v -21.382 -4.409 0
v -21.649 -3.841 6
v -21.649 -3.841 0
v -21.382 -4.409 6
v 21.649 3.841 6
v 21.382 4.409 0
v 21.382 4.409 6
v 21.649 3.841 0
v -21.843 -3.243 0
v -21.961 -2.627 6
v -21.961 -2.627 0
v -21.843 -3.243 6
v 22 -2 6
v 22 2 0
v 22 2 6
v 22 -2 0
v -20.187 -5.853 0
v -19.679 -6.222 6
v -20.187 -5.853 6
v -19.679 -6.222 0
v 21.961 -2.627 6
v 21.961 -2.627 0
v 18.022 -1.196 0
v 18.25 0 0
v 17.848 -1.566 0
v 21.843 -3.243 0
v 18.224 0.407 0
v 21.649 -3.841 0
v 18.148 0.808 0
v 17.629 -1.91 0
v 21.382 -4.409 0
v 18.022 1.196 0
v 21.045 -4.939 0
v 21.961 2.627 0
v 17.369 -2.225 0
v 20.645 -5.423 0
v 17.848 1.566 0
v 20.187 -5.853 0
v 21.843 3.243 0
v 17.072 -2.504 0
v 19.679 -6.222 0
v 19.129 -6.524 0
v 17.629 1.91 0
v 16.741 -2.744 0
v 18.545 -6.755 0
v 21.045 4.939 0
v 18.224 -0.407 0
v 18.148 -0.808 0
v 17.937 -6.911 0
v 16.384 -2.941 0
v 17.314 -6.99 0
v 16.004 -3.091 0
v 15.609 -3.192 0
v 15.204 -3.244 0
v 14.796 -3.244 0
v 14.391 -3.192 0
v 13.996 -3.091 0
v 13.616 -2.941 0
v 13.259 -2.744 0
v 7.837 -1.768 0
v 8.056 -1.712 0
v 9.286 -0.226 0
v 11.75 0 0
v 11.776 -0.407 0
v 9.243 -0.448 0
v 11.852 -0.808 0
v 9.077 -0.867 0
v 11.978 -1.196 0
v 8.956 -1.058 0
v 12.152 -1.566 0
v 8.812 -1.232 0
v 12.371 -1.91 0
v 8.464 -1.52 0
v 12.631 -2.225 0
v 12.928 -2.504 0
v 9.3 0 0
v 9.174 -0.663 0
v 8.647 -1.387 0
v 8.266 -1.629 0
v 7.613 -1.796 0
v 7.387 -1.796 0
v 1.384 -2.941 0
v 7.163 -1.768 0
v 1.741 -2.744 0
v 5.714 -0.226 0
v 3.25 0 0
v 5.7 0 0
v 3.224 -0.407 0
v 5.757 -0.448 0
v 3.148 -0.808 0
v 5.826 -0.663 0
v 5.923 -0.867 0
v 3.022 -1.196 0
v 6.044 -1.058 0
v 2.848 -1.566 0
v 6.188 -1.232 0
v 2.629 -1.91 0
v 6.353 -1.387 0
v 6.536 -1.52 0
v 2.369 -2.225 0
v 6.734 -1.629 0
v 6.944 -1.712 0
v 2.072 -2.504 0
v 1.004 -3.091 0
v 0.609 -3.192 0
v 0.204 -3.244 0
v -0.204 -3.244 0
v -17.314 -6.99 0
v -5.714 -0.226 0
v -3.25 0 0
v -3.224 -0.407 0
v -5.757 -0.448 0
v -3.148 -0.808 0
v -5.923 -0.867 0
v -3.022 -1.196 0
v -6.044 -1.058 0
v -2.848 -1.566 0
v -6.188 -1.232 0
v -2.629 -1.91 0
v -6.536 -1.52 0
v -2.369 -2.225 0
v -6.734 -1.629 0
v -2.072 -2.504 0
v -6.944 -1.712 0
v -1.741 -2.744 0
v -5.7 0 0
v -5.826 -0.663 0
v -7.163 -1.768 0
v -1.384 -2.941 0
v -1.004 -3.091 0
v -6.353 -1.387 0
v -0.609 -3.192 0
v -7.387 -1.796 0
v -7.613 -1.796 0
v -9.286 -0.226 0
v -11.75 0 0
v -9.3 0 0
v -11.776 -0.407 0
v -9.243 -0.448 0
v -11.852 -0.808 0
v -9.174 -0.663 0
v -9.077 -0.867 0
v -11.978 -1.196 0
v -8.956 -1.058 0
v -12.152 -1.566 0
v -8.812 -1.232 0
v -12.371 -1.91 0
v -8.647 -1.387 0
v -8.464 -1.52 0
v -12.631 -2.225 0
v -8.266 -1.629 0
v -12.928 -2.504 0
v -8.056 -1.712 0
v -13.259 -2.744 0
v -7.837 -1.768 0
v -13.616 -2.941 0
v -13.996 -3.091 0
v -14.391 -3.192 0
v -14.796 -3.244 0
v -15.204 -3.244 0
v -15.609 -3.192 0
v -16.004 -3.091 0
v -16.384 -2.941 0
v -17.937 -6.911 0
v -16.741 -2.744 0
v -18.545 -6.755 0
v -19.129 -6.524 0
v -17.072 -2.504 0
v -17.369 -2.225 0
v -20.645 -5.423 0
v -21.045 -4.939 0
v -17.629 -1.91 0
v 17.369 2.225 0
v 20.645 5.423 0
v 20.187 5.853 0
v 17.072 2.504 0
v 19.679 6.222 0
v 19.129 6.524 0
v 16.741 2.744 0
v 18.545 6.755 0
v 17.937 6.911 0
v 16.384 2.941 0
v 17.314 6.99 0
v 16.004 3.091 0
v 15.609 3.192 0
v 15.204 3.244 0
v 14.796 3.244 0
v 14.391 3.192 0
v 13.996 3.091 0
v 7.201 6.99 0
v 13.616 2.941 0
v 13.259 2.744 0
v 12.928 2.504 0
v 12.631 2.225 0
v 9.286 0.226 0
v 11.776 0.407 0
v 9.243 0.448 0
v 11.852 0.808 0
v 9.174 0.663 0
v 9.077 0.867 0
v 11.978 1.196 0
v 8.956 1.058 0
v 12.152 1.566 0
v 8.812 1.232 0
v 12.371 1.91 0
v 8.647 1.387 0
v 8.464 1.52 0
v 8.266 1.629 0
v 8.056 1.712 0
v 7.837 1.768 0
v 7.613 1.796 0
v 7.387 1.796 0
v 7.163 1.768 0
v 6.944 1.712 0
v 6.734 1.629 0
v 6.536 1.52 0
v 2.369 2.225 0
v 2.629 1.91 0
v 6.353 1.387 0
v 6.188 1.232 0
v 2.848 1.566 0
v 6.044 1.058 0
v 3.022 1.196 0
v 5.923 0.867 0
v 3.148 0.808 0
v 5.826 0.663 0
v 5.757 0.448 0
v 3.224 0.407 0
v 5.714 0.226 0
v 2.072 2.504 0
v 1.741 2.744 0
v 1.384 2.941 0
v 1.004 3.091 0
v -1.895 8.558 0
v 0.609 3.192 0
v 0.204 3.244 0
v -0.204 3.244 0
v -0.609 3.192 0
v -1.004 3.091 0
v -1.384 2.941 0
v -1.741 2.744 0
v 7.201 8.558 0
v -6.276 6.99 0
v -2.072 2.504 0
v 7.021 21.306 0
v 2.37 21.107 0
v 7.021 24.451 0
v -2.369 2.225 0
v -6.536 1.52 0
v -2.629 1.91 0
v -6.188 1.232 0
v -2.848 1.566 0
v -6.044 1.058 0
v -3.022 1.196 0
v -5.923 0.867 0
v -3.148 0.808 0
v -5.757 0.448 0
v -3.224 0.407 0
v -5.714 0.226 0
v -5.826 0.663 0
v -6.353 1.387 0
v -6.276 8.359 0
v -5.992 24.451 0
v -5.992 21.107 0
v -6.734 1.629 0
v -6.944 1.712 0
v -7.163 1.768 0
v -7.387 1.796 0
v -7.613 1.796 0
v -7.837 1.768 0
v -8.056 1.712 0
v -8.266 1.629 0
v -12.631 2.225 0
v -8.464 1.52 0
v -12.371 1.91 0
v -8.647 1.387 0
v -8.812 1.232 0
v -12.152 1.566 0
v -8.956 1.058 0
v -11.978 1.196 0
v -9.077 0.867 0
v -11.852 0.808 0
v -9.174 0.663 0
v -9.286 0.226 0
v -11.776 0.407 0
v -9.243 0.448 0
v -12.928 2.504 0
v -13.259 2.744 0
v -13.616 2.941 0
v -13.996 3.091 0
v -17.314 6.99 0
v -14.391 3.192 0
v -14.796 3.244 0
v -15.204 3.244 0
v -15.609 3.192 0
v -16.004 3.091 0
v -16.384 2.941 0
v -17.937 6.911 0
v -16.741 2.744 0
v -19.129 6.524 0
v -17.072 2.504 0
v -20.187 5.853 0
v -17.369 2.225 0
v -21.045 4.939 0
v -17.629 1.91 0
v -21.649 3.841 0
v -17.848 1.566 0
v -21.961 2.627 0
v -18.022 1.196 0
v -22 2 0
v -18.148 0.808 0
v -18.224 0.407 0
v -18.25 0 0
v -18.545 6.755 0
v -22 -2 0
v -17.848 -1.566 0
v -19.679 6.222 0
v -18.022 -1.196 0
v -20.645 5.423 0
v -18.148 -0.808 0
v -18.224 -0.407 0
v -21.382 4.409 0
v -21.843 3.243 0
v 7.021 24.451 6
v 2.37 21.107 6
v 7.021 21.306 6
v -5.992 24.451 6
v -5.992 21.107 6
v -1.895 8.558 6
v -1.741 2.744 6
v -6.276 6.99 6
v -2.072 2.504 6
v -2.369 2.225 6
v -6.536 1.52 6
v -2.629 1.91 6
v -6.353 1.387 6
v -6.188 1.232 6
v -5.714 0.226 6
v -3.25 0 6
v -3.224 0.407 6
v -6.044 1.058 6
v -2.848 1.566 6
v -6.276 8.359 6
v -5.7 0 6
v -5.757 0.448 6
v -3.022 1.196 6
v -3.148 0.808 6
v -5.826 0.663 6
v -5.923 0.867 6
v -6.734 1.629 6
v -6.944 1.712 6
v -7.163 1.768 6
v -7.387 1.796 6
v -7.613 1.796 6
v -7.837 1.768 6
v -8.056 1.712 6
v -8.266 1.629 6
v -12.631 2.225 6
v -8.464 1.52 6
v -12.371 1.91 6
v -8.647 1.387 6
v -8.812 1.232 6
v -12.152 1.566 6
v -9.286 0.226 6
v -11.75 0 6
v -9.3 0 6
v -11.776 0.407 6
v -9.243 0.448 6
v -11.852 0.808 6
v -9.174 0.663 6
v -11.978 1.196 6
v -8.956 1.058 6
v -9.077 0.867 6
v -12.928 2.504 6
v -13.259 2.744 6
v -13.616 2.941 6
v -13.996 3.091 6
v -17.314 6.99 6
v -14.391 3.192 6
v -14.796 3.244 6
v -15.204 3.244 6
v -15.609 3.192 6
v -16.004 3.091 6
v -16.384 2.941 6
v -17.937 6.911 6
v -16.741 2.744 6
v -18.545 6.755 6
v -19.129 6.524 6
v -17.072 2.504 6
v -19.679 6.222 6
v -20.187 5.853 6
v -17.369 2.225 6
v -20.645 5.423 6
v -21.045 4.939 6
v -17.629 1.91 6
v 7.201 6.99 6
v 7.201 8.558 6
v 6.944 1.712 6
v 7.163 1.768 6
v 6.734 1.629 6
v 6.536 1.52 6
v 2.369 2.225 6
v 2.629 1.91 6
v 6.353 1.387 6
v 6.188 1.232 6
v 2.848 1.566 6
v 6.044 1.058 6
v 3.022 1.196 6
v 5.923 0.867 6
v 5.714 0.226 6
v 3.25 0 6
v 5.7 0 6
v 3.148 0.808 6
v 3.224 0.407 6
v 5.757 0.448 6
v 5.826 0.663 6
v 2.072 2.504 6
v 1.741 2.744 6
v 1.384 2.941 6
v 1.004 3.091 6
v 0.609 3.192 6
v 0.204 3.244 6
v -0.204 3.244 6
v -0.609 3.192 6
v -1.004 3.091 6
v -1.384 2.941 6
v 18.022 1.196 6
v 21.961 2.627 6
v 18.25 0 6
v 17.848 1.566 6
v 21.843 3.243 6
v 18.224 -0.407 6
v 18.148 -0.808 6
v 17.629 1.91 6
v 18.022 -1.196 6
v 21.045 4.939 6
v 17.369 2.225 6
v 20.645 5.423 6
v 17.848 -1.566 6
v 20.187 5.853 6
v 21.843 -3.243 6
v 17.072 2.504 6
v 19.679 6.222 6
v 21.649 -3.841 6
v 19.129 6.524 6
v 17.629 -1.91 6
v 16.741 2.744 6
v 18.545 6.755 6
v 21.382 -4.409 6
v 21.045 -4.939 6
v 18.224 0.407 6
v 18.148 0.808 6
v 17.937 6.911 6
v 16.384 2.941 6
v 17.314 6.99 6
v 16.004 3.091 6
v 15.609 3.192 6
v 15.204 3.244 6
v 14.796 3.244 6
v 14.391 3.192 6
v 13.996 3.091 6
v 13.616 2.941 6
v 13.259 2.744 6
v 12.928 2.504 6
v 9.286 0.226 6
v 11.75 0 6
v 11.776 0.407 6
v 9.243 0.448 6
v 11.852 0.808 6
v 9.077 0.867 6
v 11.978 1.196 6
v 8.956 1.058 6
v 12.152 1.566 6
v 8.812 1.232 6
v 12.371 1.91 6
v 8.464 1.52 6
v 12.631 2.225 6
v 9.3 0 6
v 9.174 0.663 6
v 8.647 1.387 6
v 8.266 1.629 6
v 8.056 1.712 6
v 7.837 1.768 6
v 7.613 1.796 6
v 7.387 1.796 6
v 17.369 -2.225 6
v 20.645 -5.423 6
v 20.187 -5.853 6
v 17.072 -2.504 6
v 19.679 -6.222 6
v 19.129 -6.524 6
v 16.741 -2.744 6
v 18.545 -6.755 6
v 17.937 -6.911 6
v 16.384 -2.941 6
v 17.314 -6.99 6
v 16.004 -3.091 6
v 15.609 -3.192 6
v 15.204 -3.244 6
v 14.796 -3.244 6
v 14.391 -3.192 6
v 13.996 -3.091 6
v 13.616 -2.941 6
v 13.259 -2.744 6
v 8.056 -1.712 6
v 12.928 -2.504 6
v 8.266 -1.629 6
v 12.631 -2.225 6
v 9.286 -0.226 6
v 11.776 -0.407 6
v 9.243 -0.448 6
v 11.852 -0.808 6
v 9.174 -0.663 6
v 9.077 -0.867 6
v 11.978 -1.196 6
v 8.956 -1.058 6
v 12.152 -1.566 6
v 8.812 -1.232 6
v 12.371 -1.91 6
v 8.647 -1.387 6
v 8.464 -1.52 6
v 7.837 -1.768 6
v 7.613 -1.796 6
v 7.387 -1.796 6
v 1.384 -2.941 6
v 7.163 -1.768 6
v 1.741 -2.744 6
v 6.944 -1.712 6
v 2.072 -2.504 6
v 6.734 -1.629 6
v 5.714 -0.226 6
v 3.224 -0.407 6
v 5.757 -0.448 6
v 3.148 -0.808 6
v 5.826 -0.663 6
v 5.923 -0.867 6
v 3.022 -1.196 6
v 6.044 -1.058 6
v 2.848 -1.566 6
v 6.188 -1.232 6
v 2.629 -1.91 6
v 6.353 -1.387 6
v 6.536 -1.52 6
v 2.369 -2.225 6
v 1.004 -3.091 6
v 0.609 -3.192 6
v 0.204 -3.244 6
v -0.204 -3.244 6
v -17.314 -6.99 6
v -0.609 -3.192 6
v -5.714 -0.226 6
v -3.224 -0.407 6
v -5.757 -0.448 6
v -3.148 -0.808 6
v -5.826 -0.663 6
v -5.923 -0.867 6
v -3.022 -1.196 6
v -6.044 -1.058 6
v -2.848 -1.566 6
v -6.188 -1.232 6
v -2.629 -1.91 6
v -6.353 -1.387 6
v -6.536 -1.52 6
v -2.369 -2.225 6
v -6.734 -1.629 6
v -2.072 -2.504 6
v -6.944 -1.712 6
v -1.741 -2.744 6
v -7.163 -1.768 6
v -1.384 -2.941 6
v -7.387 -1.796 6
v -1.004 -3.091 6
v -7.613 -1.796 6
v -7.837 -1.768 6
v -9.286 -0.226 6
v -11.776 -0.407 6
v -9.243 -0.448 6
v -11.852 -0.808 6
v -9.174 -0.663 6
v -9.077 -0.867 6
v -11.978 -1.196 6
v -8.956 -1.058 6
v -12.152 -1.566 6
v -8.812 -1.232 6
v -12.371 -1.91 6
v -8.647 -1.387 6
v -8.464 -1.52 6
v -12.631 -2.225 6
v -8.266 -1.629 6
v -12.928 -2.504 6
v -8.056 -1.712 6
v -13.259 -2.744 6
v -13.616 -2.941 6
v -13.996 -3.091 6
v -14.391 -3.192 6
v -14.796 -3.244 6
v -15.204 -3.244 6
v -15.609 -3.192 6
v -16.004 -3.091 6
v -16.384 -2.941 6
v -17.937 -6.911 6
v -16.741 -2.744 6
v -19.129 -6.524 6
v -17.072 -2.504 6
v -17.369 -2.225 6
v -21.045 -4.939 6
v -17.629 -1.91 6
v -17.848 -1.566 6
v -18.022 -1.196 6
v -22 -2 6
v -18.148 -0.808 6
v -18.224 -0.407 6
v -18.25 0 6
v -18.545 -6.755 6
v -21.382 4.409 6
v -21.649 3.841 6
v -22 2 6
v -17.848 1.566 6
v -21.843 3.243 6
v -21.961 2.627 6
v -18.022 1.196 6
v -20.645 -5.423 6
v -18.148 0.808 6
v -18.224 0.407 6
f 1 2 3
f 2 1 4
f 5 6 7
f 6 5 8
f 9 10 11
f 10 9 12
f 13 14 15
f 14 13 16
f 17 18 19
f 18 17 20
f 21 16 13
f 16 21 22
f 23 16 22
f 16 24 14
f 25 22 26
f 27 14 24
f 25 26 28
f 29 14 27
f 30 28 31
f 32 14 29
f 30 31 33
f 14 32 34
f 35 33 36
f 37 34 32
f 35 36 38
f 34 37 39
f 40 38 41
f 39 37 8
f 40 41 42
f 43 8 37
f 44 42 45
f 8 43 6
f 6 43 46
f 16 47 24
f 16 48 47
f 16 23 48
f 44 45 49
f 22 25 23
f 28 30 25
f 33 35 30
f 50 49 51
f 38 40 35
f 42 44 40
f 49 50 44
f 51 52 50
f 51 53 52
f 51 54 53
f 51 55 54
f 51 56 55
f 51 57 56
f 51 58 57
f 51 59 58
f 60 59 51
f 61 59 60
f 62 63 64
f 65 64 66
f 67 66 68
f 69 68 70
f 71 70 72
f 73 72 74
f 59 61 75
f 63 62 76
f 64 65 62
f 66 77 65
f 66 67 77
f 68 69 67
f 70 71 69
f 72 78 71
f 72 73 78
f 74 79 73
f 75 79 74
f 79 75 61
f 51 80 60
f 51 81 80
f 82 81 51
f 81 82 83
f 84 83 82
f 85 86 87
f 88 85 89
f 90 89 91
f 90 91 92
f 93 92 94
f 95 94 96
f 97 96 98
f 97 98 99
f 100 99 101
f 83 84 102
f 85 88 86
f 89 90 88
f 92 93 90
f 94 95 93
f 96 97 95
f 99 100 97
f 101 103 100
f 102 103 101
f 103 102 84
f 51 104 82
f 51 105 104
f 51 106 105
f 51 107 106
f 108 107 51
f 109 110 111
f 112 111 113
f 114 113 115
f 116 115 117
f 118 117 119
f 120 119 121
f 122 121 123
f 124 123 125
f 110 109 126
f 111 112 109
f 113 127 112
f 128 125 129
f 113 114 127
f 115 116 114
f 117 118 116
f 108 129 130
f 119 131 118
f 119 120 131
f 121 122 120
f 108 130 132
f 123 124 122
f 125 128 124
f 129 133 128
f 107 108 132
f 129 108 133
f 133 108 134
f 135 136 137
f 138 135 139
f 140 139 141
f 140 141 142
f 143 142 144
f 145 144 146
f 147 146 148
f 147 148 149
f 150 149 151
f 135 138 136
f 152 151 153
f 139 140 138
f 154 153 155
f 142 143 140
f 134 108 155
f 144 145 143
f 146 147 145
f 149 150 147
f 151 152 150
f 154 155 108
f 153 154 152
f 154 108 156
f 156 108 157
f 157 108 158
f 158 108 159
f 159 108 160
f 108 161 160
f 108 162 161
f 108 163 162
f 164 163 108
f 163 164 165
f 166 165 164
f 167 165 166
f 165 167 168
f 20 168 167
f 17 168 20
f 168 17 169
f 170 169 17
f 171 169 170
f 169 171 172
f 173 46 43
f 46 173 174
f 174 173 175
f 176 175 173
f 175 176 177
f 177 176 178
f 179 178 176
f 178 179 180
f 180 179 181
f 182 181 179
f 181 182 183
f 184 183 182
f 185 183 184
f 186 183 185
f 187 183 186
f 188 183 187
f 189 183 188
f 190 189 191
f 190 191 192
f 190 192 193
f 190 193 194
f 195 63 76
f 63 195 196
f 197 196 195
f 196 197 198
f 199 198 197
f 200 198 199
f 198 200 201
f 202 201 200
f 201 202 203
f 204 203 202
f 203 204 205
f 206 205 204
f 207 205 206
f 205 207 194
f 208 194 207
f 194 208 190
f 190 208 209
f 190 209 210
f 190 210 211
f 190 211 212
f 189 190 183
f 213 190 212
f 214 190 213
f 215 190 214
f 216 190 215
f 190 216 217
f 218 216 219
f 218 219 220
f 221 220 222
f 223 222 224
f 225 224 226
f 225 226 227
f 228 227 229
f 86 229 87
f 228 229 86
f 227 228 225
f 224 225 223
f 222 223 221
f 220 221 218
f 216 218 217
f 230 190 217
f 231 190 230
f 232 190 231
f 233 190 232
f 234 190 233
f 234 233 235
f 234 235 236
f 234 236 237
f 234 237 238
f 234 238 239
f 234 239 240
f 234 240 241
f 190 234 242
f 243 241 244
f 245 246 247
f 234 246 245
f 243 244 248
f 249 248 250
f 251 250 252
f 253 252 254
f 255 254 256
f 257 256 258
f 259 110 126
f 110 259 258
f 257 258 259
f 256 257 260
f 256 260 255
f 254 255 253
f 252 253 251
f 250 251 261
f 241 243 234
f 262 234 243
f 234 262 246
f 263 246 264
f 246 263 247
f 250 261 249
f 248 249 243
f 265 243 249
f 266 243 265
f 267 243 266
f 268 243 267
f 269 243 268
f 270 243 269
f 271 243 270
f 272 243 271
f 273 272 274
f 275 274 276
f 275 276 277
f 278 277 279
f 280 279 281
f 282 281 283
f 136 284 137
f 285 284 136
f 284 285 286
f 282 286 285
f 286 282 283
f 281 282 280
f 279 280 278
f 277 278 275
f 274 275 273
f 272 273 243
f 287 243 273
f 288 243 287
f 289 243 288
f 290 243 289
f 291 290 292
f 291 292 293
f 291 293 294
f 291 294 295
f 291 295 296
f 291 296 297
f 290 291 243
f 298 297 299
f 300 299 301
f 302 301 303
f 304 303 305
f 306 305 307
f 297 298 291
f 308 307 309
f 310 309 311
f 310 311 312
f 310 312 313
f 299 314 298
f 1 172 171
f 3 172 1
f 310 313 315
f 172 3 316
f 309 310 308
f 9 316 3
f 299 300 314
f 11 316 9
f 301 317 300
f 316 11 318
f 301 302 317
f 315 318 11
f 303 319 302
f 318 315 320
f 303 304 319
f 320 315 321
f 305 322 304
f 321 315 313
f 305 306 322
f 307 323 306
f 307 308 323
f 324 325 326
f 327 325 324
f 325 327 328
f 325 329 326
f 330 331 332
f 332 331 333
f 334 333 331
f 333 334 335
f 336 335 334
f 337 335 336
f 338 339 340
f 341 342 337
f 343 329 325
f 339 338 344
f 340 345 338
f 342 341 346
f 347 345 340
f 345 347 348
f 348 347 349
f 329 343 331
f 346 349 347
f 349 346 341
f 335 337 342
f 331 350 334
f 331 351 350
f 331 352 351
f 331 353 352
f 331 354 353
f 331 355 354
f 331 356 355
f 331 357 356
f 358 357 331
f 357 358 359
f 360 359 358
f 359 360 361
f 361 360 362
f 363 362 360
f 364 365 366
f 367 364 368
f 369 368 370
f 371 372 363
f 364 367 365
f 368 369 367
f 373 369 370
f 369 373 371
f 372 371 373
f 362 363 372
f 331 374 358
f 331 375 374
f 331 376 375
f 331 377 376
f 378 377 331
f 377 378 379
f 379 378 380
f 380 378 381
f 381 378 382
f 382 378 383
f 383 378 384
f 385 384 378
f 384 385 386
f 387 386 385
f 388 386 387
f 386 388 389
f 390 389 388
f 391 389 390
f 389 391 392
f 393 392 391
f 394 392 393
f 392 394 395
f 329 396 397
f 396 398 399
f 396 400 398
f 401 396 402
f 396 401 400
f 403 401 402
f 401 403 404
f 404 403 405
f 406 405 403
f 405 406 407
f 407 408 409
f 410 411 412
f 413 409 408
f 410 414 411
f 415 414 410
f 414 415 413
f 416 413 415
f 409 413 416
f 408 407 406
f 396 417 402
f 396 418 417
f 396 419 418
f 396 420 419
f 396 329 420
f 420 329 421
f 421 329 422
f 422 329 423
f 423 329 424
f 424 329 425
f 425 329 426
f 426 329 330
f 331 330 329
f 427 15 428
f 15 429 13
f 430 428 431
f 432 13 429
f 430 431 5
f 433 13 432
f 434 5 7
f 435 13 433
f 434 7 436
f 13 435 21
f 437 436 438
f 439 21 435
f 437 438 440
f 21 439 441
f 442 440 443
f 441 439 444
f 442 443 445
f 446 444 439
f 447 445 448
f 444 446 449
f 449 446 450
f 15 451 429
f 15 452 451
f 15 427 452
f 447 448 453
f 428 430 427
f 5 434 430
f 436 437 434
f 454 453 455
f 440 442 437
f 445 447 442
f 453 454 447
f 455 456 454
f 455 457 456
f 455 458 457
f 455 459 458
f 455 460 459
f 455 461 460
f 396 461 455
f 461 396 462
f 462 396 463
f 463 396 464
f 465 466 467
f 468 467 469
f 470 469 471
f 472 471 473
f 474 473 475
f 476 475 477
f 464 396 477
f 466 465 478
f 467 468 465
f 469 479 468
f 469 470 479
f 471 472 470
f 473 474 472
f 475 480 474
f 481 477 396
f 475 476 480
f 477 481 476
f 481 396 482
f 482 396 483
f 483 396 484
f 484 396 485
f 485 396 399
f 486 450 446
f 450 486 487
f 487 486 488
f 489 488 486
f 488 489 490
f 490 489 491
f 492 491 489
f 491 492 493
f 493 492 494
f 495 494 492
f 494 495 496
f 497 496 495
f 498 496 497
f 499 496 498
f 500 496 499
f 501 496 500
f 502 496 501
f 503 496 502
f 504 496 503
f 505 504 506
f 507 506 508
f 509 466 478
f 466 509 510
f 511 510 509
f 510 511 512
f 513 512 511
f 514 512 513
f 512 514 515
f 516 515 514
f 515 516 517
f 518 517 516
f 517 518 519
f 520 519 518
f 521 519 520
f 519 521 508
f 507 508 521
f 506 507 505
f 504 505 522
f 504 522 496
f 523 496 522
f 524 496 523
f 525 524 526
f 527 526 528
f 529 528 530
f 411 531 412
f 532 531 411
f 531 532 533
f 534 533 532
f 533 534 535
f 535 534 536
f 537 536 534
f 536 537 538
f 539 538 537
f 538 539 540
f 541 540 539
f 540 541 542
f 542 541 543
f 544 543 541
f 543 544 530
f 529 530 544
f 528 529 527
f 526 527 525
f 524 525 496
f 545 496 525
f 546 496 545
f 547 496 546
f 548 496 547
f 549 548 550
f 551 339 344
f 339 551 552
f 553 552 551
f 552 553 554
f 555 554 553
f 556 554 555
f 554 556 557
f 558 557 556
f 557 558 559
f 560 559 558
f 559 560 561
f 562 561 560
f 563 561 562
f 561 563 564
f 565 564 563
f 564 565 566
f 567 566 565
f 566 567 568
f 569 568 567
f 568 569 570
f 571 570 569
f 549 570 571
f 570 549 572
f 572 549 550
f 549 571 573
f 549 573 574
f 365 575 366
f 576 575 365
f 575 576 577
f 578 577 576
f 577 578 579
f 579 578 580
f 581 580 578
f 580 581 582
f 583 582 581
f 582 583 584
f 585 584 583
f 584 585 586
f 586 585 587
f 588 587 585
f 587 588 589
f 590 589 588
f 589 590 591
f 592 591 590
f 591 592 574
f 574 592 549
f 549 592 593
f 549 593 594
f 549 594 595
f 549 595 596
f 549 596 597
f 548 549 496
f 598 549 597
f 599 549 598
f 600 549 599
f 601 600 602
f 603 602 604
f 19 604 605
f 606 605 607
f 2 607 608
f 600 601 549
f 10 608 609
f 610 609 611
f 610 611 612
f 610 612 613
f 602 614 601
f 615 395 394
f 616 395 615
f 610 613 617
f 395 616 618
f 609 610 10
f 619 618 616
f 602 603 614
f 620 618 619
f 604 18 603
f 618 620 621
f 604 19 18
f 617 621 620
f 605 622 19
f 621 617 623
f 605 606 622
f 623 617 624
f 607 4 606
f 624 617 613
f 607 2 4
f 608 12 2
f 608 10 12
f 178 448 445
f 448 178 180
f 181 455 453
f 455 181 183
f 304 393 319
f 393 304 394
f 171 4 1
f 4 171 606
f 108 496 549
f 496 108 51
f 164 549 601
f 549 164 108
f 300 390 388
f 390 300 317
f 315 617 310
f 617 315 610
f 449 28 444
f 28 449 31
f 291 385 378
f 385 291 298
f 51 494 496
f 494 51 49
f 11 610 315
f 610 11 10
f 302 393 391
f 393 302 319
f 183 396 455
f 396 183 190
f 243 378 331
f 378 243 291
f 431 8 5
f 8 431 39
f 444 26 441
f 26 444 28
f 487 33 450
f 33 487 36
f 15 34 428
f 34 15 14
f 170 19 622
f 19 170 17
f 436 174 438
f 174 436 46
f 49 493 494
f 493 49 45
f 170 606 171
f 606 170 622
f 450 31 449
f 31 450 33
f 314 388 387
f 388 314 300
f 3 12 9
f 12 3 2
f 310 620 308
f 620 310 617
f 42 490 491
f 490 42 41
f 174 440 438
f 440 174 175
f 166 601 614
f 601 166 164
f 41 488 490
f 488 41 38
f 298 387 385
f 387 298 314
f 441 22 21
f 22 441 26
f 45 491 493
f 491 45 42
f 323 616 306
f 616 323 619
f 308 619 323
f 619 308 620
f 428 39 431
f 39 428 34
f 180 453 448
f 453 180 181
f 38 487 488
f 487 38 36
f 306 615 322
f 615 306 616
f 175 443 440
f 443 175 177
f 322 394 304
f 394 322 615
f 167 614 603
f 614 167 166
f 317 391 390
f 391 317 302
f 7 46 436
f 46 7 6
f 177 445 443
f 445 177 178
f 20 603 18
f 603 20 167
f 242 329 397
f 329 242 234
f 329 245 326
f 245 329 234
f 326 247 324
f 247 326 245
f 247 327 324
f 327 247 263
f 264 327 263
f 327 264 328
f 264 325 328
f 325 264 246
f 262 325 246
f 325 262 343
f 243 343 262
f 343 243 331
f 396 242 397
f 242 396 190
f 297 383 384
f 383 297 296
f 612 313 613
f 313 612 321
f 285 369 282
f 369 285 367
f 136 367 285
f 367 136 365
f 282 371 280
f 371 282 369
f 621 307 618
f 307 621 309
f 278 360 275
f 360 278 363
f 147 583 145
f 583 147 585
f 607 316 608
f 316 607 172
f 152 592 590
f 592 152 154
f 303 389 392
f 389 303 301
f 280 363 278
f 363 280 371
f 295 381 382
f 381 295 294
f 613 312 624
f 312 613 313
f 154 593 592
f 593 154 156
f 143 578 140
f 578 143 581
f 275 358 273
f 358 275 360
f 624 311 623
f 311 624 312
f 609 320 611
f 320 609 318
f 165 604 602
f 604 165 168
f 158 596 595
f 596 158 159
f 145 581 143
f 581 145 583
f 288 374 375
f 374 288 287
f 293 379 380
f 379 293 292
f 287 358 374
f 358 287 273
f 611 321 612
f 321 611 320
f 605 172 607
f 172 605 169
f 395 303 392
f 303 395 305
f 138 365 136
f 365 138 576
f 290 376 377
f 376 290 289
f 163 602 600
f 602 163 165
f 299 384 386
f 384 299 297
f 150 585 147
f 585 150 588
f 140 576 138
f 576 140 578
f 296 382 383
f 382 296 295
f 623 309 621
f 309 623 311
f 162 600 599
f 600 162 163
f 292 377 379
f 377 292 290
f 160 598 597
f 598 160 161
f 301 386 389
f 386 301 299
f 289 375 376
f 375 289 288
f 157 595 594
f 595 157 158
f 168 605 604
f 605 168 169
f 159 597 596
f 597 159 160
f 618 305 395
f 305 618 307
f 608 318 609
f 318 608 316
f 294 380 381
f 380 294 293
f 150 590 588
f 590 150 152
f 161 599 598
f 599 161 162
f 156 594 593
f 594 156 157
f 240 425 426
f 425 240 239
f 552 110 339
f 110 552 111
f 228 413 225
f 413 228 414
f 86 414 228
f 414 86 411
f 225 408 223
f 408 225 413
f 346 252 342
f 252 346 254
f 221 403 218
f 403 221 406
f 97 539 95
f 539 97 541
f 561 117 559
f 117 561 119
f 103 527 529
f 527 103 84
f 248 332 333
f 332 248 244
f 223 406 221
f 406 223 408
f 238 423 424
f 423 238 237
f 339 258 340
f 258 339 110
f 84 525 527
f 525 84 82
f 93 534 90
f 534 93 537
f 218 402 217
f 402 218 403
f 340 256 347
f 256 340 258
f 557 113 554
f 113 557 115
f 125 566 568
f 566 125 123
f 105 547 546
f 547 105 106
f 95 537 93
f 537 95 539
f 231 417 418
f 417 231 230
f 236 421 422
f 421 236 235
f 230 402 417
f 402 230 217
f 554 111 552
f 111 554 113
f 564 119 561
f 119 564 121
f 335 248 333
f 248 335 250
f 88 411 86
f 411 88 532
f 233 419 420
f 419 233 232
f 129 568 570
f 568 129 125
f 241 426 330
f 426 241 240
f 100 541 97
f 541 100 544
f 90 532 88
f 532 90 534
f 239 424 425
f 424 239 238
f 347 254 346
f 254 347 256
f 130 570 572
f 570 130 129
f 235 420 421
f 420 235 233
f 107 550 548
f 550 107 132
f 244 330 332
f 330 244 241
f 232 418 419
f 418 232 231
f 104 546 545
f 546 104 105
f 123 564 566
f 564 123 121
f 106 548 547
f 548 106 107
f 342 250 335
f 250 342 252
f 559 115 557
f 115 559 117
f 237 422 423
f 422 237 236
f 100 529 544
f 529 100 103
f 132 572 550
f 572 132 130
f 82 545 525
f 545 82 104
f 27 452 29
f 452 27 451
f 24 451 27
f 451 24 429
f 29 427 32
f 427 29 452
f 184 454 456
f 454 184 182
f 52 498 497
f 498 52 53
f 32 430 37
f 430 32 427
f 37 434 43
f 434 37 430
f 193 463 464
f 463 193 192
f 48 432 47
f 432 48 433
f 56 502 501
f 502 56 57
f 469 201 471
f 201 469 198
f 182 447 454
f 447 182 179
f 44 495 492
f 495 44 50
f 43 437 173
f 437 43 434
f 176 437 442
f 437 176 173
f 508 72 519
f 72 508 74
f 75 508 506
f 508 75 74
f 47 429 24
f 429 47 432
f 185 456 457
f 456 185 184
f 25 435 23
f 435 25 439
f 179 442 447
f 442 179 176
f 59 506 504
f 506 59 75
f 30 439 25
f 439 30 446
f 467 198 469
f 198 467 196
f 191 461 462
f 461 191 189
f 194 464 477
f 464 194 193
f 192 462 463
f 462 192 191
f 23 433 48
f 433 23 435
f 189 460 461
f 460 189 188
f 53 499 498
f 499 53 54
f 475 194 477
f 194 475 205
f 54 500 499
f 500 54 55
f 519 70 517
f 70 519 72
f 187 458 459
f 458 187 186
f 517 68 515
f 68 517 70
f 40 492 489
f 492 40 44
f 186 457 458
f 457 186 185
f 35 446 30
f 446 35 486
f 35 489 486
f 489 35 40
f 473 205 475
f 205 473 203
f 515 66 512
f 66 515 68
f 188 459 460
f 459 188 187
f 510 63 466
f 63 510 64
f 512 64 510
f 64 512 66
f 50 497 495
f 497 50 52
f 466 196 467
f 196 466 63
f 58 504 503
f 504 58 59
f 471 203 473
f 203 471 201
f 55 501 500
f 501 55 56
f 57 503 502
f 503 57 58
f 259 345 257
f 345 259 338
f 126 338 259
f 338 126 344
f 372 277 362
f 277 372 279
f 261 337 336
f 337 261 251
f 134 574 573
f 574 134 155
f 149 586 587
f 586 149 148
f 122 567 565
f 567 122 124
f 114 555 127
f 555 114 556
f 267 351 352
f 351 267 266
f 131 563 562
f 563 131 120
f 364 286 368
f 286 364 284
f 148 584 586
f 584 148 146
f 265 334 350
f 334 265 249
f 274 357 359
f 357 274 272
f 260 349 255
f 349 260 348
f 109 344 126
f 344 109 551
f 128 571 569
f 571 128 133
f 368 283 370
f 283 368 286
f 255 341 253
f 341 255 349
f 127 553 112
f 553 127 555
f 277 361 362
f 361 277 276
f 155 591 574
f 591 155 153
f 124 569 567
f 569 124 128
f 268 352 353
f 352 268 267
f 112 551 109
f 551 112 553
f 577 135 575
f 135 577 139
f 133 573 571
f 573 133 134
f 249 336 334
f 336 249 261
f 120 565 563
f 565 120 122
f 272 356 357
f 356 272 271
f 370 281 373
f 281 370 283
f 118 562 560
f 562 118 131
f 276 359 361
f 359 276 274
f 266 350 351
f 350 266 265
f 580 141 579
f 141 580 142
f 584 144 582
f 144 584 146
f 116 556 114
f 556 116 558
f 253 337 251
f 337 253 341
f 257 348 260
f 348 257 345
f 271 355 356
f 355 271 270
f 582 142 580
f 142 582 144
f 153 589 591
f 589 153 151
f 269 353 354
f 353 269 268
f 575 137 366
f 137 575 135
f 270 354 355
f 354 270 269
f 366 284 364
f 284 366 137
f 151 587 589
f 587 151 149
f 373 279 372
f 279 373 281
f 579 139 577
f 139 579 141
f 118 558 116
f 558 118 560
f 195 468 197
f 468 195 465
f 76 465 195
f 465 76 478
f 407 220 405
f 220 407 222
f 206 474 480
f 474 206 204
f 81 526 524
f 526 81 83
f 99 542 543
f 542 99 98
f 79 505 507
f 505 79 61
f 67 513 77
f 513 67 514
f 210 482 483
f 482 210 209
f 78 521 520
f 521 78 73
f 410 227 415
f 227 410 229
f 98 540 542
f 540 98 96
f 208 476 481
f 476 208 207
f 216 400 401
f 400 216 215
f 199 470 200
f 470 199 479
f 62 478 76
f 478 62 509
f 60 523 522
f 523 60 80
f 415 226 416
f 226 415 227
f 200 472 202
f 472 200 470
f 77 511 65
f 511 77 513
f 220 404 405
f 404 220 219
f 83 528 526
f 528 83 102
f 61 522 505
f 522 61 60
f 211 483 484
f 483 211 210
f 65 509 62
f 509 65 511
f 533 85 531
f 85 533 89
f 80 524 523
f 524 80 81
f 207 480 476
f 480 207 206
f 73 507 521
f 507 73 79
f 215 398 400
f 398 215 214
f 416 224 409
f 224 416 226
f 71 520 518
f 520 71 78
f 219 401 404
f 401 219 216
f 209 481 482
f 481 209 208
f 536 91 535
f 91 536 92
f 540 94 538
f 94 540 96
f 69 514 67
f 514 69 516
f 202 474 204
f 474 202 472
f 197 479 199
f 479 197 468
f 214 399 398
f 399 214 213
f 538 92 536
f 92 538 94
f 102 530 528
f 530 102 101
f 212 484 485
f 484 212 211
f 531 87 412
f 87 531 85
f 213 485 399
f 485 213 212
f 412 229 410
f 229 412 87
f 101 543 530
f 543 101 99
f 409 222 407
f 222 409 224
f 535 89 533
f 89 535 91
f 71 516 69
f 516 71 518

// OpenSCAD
$fn = 50;


difference() {
	union() {
		hull() {
			translate(v = [-17.0000000000, 2.0000000000, 0]) {
				cylinder(h = 6, r = 5);
			}
			translate(v = [17.0000000000, 2.0000000000, 0]) {
				cylinder(h = 6, r = 5);
			}
			translate(v = [-17.0000000000, -2.0000000000, 0]) {
				cylinder(h = 6, r = 5);
			}
			translate(v = [17.0000000000, -2.0000000000, 0]) {
				cylinder(h = 6, r = 5);
			}
		}
		translate(v = [0, 24, 0]) {
			linear_extrude(height = 6) {
				text(font = "DejaVu Sans Mono:style=Bold", halign = "center", size = 19.0000000000, text = "Z", valign = "top");
			}
		}
	}
	union() {
		translate(v = [-15.0000000000, 0.0000000000, 0]) {
			translate(v = [0, 0, -100]) {
				cylinder(h = 200, r = 3.2500000000);
			}
		}
		translate(v = [0, 0, -100]) {
			cylinder(h = 200, r = 3.2500000000);
		}
		translate(v = [15.0000000000, 0.0000000000, 0]) {
			translate(v = [0, 0, -100]) {
				cylinder(h = 200, r = 3.2500000000);
			}
		}
		translate(v = [-15.0000000000, 0.0000000000, 0]) {
			translate(v = [0, 0, -100]) {
				cylinder(h = 200, r = 1.8000000000);
			}
		}
		translate(v = [-7.5000000000, 0.0000000000, 0]) {
			translate(v = [0, 0, -100]) {
				cylinder(h = 200, r = 1.8000000000);
			}
		}
		translate(v = [0, 0, -100]) {
			cylinder(h = 200, r = 1.8000000000);
		}
		translate(v = [7.5000000000, 0.0000000000, 0]) {
			translate(v = [0, 0, -100]) {
				cylinder(h = 200, r = 1.8000000000);
			}
		}
		translate(v = [15.0000000000, 0.0000000000, 0]) {
			translate(v = [0, 0, -100]) {
				cylinder(h = 200, r = 1.8000000000);
			}
		}
	}
}
